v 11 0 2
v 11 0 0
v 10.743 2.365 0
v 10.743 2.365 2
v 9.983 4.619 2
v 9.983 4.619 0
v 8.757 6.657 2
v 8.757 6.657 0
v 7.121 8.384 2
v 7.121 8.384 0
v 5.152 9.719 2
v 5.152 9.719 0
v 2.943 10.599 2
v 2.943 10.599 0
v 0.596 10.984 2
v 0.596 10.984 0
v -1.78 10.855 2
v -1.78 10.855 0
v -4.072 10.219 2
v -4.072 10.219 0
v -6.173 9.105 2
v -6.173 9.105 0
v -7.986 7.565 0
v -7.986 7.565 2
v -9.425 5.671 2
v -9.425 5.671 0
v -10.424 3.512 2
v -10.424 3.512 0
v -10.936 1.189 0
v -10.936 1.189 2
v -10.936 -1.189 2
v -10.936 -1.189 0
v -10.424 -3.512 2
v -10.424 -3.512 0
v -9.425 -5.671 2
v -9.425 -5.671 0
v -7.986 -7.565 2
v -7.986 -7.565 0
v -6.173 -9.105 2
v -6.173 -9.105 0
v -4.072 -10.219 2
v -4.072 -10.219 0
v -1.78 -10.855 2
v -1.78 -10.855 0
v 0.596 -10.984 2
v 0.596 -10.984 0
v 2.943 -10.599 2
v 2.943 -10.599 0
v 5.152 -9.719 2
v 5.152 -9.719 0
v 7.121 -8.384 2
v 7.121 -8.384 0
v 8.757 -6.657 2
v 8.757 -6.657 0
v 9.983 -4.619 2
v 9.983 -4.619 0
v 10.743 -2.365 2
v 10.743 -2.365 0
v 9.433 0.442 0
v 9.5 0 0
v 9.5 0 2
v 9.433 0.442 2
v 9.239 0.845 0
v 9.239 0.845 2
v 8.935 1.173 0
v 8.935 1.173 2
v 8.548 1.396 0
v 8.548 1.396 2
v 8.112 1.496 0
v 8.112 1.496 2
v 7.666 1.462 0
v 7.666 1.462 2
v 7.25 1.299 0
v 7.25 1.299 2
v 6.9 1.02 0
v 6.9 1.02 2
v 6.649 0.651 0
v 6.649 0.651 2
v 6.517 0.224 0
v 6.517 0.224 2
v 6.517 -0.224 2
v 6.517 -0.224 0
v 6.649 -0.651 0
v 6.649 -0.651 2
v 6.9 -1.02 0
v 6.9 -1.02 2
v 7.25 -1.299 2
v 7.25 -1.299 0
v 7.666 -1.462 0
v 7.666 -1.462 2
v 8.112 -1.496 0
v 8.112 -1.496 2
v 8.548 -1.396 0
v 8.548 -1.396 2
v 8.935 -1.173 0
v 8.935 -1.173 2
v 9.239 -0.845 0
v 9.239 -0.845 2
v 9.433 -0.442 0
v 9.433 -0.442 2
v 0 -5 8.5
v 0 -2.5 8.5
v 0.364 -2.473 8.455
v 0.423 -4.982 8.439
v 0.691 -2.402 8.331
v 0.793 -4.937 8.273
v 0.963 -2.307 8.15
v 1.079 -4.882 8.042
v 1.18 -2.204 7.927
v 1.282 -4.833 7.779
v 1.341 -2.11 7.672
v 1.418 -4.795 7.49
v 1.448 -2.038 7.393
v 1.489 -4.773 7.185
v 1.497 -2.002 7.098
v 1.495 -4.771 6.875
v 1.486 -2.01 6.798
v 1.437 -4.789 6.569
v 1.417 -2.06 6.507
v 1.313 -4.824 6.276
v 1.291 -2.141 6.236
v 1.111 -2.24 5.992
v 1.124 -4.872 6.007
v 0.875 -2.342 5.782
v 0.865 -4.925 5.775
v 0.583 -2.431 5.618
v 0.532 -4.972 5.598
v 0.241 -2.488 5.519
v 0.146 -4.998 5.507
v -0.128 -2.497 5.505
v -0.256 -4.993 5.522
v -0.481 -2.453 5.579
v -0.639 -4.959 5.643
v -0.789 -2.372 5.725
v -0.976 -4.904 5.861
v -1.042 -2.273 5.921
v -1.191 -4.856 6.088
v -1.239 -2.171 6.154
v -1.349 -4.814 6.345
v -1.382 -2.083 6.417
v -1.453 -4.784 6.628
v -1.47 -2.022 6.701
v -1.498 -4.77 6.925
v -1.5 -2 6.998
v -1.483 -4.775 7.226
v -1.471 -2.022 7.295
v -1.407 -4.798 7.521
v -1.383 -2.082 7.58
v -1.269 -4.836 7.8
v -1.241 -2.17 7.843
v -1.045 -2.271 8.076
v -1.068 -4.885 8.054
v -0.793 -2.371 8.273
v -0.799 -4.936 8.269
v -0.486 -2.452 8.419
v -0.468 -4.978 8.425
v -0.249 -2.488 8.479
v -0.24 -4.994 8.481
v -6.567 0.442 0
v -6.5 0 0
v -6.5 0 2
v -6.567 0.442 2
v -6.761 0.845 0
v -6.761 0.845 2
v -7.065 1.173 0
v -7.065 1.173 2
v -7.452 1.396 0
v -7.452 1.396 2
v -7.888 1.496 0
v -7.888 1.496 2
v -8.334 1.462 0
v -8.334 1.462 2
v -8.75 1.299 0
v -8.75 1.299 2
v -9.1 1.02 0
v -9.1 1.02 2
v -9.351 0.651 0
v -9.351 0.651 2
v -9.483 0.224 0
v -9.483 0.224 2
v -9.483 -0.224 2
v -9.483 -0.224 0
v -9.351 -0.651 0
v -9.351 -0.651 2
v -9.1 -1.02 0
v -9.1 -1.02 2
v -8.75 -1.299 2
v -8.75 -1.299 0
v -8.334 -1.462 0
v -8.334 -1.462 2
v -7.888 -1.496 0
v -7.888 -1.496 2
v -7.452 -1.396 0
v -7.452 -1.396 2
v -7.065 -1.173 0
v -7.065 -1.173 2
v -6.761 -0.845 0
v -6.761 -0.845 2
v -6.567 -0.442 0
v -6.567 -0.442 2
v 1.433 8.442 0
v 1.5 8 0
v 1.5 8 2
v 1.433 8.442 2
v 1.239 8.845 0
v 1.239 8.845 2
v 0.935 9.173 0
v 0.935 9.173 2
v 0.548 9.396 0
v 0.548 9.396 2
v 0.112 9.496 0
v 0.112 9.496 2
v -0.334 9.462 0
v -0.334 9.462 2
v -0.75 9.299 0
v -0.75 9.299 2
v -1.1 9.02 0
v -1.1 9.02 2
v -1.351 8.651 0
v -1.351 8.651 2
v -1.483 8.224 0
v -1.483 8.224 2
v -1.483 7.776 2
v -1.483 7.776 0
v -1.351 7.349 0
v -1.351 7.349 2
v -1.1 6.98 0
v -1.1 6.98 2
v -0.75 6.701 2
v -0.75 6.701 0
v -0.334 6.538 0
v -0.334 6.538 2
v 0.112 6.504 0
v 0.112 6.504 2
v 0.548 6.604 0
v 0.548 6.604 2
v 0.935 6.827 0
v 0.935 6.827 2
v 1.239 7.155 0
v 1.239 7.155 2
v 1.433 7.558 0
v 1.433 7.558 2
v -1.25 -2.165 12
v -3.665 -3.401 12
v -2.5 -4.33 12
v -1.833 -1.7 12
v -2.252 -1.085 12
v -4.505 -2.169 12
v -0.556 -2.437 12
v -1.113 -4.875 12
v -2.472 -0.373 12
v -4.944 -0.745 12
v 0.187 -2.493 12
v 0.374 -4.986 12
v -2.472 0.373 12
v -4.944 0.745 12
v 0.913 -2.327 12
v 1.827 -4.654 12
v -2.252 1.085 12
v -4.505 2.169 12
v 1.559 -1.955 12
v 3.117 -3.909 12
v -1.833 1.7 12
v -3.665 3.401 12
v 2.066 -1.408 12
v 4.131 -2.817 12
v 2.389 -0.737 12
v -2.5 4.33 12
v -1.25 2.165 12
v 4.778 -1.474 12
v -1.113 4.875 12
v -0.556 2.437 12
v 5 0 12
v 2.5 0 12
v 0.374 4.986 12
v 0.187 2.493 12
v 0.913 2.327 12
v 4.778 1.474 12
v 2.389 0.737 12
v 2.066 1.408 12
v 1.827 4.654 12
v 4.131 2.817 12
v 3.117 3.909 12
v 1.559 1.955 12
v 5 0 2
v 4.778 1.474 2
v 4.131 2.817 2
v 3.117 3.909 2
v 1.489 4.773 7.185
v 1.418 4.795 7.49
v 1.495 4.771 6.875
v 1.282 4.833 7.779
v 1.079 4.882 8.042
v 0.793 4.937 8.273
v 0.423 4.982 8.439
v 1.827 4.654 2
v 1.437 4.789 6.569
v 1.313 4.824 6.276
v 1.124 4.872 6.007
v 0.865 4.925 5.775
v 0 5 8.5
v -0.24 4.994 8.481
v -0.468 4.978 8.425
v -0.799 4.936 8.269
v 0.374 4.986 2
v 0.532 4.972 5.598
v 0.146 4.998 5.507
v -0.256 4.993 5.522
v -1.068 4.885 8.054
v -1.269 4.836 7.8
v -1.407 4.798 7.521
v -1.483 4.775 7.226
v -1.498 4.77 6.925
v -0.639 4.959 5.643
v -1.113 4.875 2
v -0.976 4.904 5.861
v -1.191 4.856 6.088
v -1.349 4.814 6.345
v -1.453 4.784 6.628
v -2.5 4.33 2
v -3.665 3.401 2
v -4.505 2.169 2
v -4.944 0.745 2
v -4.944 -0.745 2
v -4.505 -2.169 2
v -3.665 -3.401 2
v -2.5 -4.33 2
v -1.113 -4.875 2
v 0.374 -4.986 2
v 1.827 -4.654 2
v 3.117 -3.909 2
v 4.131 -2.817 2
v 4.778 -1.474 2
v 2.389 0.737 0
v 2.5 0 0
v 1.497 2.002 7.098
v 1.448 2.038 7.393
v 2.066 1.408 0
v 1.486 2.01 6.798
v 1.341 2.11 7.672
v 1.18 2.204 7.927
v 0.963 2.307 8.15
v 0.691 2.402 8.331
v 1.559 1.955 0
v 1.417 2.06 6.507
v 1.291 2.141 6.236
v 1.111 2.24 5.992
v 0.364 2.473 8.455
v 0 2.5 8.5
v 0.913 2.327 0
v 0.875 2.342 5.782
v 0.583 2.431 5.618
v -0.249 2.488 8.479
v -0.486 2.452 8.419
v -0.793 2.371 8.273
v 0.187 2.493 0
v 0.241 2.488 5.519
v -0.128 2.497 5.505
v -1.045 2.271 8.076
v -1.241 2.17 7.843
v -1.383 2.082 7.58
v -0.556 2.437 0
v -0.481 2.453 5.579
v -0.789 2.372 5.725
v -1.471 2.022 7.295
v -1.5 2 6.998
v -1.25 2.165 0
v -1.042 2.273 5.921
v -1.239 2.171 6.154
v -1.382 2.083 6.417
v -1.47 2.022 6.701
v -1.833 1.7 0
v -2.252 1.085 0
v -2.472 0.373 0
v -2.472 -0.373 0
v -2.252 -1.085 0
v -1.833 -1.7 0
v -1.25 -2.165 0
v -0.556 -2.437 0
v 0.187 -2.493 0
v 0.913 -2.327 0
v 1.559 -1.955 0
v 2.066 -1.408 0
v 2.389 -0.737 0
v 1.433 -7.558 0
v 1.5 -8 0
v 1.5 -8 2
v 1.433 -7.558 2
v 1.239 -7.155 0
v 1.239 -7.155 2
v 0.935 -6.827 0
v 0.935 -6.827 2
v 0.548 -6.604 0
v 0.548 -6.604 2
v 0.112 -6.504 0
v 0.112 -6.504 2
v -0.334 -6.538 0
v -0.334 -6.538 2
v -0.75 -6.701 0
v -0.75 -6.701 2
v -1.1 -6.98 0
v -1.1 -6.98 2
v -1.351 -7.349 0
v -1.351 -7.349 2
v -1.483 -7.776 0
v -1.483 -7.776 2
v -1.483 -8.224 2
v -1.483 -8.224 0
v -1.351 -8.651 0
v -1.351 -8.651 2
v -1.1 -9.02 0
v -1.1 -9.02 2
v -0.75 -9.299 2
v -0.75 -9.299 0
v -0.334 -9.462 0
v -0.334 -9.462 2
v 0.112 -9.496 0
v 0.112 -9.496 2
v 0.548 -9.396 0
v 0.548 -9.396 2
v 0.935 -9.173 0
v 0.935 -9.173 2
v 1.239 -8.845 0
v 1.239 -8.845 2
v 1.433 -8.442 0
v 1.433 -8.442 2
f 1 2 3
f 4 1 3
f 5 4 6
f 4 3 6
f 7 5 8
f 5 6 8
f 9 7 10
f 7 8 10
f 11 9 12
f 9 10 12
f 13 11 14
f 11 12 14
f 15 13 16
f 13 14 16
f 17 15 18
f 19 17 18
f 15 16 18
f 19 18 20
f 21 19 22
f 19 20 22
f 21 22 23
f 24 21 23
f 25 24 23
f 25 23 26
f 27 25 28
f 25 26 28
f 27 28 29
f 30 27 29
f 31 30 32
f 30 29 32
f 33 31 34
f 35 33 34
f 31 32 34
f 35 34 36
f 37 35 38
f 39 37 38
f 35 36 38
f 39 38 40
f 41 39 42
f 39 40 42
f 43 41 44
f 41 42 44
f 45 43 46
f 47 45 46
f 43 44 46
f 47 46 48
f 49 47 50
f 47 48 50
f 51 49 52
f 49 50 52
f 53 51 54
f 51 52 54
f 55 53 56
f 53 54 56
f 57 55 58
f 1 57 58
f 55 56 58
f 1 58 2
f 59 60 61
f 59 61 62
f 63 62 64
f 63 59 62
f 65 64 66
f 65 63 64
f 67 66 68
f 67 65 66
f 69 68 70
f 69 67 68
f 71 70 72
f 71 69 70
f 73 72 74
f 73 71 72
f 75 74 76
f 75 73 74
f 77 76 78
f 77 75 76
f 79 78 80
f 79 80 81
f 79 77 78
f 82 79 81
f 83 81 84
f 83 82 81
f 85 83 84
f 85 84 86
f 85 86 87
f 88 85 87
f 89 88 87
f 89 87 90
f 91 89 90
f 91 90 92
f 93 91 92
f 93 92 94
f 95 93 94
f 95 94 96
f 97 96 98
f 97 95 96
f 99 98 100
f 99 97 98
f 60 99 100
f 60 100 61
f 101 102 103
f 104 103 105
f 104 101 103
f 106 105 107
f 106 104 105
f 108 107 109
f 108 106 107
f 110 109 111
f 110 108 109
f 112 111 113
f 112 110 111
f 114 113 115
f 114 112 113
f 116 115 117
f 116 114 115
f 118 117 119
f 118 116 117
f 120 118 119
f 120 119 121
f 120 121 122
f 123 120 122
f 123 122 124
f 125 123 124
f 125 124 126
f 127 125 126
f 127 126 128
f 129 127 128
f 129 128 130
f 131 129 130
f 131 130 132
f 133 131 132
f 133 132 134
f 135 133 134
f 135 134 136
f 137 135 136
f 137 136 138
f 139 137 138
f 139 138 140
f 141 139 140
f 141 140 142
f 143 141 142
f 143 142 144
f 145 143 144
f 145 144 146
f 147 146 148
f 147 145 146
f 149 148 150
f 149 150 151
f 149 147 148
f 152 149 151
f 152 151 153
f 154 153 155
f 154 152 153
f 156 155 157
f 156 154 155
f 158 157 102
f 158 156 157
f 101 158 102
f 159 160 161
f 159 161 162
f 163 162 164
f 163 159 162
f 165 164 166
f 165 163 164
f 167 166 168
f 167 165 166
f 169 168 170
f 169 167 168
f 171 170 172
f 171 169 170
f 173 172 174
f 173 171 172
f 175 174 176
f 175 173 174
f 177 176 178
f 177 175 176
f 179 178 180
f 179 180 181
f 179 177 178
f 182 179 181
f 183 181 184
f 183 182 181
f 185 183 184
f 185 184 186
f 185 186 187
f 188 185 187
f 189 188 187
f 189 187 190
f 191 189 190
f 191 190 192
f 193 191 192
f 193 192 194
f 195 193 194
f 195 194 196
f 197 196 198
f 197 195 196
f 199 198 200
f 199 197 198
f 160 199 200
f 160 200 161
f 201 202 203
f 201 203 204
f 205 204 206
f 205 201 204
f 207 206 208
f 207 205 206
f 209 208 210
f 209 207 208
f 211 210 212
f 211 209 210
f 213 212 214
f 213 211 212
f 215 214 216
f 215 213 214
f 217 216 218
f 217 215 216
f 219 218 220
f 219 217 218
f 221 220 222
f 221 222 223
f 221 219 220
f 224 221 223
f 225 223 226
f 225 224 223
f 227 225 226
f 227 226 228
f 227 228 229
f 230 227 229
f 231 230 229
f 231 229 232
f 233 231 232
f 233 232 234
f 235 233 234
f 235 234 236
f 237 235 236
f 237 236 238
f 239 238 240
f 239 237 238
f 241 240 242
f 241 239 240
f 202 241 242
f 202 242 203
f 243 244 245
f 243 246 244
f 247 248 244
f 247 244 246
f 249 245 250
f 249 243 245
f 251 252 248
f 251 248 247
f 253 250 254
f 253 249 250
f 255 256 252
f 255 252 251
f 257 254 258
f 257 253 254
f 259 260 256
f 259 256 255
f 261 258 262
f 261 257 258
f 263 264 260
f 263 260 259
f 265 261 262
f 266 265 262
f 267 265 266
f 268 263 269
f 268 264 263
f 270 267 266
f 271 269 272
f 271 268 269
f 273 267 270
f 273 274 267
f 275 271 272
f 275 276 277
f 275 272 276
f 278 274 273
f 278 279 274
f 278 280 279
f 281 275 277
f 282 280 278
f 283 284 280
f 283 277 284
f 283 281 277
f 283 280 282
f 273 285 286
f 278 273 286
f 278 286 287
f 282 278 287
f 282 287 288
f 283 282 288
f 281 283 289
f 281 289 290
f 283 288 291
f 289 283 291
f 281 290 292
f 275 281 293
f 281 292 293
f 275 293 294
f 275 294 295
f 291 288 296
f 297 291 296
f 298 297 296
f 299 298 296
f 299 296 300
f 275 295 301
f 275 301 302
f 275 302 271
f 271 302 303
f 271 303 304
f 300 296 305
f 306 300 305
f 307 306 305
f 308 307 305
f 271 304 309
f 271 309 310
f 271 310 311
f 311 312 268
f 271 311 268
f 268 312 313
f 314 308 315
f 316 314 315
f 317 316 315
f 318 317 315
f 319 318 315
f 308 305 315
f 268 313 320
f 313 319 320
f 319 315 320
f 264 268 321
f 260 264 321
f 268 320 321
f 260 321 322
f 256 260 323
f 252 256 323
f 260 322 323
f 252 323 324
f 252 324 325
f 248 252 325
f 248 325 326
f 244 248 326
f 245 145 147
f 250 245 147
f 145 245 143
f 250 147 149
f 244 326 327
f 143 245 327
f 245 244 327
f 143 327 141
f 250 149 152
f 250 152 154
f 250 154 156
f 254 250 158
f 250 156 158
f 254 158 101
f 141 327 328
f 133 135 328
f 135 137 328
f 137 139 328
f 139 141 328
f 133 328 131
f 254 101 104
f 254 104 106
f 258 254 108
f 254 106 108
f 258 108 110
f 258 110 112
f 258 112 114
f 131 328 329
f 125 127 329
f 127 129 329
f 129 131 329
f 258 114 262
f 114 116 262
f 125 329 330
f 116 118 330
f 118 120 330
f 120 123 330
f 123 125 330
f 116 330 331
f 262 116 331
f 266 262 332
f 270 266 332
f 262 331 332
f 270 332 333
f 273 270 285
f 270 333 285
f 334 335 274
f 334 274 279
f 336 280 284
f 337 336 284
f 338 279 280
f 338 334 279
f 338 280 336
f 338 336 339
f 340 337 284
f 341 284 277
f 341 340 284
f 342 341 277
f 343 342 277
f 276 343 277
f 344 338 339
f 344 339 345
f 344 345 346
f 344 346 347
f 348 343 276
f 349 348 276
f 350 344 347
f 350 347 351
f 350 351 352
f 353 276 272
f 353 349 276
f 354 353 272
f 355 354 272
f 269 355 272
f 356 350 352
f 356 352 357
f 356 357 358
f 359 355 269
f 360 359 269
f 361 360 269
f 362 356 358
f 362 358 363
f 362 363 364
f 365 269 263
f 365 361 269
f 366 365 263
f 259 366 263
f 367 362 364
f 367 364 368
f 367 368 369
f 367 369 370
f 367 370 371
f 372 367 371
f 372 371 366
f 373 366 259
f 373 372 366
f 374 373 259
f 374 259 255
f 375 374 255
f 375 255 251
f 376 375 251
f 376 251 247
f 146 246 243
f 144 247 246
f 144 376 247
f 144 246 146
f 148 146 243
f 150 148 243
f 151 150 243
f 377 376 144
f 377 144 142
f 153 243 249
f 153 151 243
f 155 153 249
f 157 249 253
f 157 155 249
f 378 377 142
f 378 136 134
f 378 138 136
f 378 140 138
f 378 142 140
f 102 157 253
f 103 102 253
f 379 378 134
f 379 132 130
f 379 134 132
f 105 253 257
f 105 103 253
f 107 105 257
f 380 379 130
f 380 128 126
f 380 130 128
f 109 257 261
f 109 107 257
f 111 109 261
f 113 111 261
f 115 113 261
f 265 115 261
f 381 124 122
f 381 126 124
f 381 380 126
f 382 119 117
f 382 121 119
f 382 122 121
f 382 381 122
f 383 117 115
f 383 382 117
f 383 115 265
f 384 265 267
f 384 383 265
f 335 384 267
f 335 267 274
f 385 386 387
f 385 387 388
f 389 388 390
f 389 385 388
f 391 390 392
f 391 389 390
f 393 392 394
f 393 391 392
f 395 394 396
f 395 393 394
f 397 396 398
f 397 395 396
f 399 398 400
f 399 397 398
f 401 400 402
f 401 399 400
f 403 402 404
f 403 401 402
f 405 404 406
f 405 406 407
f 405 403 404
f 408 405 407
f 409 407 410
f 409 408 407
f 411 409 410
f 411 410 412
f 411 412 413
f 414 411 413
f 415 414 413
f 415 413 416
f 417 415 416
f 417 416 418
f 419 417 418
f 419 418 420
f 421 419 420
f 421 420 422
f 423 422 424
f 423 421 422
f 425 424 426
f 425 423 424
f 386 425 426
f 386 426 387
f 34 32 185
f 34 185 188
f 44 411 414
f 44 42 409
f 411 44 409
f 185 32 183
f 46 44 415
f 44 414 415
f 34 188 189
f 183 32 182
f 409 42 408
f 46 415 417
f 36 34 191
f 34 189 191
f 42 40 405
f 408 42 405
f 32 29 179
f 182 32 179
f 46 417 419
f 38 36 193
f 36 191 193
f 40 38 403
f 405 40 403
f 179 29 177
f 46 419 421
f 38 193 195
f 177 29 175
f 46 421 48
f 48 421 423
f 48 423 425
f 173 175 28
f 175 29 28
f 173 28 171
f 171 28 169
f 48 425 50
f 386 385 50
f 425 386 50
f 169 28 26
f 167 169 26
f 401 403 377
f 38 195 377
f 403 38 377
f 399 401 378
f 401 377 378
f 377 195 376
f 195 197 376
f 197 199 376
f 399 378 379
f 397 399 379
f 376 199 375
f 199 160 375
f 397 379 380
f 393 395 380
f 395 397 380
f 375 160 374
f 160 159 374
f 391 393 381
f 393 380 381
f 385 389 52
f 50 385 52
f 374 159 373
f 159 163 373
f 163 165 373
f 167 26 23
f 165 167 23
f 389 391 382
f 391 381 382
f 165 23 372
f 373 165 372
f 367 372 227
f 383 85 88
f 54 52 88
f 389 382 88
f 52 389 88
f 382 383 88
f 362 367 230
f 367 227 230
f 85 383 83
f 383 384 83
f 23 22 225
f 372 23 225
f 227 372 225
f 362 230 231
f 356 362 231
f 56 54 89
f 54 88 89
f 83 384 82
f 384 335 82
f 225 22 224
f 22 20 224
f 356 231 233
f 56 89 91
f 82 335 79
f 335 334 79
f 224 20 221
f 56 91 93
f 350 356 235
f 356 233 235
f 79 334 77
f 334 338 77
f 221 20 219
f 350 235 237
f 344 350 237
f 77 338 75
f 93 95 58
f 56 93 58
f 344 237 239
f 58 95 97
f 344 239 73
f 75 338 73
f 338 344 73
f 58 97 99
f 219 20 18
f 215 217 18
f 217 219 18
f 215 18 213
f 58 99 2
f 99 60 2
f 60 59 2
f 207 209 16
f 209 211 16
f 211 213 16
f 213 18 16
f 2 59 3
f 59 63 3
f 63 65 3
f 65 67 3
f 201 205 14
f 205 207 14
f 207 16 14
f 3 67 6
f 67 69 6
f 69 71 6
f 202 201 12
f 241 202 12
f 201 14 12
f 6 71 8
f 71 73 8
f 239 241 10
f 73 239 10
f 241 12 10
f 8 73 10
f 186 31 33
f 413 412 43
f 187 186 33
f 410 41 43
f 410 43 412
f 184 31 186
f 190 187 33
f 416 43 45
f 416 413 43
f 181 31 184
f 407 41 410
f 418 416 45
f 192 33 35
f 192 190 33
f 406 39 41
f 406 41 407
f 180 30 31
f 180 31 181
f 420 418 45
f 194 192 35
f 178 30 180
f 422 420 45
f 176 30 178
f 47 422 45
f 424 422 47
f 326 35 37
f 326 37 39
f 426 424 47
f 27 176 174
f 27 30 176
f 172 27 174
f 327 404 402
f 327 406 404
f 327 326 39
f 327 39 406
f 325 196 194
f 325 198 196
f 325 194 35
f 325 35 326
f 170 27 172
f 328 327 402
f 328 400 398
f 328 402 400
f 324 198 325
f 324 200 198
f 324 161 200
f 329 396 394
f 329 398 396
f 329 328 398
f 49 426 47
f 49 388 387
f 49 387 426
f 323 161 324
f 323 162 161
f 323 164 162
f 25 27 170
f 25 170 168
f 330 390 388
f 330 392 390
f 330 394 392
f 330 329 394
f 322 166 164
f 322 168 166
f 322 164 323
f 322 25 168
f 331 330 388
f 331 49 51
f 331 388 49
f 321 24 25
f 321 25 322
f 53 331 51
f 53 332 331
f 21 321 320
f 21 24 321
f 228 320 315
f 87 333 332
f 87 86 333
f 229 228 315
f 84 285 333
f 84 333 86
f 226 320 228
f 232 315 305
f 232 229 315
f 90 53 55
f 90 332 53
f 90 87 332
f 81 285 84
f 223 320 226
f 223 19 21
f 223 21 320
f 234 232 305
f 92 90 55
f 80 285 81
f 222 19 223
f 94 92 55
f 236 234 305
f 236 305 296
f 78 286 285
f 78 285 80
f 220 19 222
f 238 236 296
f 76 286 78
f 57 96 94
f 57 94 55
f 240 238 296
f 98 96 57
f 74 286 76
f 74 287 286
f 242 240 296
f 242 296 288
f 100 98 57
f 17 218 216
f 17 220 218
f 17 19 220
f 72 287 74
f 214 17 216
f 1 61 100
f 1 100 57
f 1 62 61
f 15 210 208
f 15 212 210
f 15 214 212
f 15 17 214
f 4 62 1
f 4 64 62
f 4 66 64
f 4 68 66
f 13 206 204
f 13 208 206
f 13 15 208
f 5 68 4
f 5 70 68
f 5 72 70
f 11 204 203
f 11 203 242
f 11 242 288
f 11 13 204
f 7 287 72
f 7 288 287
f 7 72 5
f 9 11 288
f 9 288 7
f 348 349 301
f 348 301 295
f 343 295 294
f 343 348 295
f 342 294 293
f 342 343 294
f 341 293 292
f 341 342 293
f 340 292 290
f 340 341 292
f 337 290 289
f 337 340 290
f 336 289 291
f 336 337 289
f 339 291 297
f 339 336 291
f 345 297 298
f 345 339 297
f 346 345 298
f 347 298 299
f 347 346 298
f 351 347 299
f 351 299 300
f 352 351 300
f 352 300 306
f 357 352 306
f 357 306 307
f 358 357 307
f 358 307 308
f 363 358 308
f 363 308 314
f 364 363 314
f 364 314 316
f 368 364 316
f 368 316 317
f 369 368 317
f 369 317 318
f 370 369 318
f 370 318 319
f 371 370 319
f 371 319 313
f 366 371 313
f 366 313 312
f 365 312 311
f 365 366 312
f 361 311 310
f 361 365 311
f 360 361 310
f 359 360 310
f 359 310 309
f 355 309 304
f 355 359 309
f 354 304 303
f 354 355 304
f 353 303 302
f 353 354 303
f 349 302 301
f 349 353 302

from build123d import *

# Parameters (mm, degrees)
SKETCH_1_R               = 11
SKETCH_1_R_2             = 1.5
SKETCH_1_R_3             = 2.5
EXTRUDE_1_DEPTH          = 2
SKETCH_2_R               = 5
SKETCH_2_R_2             = 2.5
EXTRUDE_2_DEPTH          = 10
CUT_EXTRUDE_1_DEPTH      = 20.646882704
CUT_EXTRUDE_1_DEPTH_BACK = 20.646882704
SKETCH_3_R               = 1.5


with BuildPart() as part:
    # Эскиз1 → Бобышка-Вытянуть1 (new body)
    with BuildSketch(Plane.XY):
        Circle(SKETCH_1_R)
        with Locations((-8, 0)):
            Circle(SKETCH_1_R_2, mode=Mode.SUBTRACT)
        with Locations((0, 8)):
            Circle(SKETCH_1_R_2, mode=Mode.SUBTRACT)
        with Locations((8, 0)):
            Circle(SKETCH_1_R_2, mode=Mode.SUBTRACT)
        with Locations((0, -8)):
            Circle(SKETCH_1_R_2, mode=Mode.SUBTRACT)
        Circle(SKETCH_1_R_3, mode=Mode.SUBTRACT)
    extrude(amount=EXTRUDE_1_DEPTH)

    # Эскиз2 → Бобышка-Вытянуть2 (add)
    with BuildSketch(Plane.XY.offset(2)):
        Circle(SKETCH_2_R)
        Circle(SKETCH_2_R_2, mode=Mode.SUBTRACT)
    extrude(amount=EXTRUDE_2_DEPTH)

    # Эскиз3 → Вырез-Вытянуть1 (cut, two sides: drawn at the far end of the back side and taken through both)
    with BuildSketch(Plane(origin=(0, 0, 0), x_dir=(1, 0, 0), z_dir=(0, 1, 0)).offset(-CUT_EXTRUDE_1_DEPTH_BACK)):
        with Locations(Location((0, -7, 0), (0, 0, 270))):
            Circle(SKETCH_3_R)
    extrude(amount=CUT_EXTRUDE_1_DEPTH + CUT_EXTRUDE_1_DEPTH_BACK, mode=Mode.SUBTRACT)


solid = part.part
